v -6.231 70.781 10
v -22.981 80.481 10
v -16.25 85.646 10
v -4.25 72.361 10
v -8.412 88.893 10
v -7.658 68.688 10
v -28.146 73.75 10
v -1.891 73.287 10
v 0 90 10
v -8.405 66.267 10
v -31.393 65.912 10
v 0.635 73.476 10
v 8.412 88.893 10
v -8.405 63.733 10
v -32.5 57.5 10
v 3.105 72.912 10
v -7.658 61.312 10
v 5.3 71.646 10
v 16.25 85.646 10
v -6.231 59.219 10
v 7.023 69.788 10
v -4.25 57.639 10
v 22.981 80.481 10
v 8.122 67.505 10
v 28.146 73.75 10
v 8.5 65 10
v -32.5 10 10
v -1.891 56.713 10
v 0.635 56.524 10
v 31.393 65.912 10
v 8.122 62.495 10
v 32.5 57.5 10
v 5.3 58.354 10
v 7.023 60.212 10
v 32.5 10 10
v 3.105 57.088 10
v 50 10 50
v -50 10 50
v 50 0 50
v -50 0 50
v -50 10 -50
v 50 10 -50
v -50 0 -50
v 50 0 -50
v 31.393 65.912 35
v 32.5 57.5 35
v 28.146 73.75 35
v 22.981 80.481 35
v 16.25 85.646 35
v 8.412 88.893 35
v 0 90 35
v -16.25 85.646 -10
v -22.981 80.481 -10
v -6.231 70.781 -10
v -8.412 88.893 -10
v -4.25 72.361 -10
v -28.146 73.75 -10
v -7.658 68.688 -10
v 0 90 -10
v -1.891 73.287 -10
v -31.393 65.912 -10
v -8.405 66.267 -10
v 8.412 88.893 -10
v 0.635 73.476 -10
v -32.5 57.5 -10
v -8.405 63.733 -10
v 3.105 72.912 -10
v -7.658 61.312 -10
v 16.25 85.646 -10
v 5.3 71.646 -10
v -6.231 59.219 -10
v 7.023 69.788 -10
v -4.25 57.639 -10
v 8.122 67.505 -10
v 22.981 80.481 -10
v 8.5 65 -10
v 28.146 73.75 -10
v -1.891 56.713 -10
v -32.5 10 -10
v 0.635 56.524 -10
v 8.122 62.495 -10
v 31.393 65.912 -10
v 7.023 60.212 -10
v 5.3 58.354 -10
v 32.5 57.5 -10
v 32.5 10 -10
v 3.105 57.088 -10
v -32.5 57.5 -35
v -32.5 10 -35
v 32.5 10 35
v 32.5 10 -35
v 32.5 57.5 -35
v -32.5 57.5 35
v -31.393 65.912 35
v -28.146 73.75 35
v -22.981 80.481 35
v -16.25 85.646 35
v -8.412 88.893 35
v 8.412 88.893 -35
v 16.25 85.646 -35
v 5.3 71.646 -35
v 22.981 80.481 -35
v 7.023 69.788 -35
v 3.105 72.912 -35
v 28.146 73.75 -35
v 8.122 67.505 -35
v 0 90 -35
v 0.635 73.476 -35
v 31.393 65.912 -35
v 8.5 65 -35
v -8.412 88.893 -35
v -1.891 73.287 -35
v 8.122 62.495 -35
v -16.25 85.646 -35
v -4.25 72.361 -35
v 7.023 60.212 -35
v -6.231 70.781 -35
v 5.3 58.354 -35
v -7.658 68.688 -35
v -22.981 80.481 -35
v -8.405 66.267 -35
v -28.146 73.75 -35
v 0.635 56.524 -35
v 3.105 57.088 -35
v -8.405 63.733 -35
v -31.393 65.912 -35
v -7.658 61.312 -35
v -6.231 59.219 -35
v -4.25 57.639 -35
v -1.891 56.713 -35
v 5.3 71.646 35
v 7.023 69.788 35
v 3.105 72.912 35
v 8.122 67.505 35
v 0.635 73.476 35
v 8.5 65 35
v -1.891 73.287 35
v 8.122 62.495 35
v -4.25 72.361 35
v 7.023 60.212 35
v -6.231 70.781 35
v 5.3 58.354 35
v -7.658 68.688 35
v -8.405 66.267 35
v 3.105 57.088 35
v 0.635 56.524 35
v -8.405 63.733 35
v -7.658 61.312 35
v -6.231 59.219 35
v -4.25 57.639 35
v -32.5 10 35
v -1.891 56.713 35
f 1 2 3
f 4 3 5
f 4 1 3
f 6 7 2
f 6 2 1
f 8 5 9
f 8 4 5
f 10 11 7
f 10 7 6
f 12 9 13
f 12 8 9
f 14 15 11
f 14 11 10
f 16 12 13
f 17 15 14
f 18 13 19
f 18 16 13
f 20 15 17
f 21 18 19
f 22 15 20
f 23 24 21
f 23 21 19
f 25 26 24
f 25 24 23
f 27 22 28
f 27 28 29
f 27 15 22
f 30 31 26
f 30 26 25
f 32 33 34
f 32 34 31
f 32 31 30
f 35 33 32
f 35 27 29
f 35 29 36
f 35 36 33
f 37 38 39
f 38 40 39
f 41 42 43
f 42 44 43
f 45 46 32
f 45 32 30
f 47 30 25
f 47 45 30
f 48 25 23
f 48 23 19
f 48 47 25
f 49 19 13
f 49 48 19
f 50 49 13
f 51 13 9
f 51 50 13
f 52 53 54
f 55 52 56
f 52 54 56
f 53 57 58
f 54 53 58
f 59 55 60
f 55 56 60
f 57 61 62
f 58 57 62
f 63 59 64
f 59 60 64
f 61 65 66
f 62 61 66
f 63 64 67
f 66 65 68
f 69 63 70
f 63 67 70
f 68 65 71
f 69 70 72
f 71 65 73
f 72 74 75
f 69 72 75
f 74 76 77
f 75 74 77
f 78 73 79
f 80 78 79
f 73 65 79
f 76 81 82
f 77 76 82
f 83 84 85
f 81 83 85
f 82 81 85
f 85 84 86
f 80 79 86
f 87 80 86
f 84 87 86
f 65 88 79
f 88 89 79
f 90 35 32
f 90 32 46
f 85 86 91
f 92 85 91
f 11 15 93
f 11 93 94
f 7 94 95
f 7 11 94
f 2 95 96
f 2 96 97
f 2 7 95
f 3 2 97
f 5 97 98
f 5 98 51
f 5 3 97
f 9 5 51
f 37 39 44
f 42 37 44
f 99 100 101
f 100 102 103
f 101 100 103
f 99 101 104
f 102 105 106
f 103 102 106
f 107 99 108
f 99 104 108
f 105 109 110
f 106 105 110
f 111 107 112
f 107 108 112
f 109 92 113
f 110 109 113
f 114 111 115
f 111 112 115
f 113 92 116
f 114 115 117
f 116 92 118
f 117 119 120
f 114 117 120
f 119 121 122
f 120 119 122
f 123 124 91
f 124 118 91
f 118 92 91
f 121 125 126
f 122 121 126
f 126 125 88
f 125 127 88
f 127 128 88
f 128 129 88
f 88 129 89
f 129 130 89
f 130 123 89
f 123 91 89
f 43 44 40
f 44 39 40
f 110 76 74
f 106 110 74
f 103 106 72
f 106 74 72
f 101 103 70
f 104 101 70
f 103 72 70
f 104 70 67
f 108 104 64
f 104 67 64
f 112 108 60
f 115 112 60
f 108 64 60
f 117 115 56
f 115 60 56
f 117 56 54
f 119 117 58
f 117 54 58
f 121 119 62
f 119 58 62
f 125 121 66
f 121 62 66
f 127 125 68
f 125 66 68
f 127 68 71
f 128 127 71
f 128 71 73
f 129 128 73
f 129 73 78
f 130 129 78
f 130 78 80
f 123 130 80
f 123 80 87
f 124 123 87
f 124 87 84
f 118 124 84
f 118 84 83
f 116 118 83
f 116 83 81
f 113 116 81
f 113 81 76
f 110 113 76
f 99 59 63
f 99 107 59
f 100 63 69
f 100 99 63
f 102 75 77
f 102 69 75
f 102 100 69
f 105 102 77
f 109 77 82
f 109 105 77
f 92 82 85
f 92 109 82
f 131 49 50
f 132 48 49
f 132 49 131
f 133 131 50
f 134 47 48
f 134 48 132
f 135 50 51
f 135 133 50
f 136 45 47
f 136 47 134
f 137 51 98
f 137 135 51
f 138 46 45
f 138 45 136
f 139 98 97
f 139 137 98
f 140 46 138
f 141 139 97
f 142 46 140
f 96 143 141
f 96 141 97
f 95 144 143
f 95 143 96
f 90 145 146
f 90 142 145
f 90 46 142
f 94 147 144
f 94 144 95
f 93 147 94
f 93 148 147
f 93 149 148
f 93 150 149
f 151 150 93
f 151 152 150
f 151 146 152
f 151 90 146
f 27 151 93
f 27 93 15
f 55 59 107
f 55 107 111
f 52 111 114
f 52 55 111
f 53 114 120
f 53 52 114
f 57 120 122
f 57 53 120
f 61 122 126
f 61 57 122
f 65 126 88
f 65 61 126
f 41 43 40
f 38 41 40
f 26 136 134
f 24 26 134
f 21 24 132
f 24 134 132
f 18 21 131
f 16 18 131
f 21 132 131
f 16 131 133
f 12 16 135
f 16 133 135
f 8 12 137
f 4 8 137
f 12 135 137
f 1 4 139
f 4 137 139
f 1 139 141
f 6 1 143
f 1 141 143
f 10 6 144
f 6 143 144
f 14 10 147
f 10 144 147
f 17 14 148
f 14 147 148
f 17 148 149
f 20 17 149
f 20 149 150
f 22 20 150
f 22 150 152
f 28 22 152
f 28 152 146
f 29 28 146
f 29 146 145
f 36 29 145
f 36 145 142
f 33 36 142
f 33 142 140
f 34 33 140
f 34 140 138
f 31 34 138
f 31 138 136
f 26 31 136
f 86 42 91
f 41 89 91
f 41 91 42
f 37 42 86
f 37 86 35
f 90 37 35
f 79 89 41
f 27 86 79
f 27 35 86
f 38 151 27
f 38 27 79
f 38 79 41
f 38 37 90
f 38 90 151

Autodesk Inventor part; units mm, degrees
ref_plane "YZ Plane" through (0, 0, 0) normal (1, 0, 0) x (0, 1, 0)
ref_plane "XZ Plane" through (0, 0, 0) normal (0, 1, 0) x (-1, 0, 0)
ref_plane "XY Plane" through (0, 0, 0) normal (0, 0, 1) x (1, 0, 0)
sketch "Boceto1" plane through (0, 0, 0) normal (0, 1, 0) x (-1, 0, 0)
  line L0 (50, 50) -> (-50, 50)
  line L1 (-50, 50) -> (-50, -50)
  line L2 (-50, -50) -> (50, -50)
  line L3 (50, -50) -> (50, 50)
  line L4 (50, 50) -> (-50, -50) construction
  line L5 (-50, 50) -> (50, -50) construction
  point P0 (0, 0)
  dimension "d0" = 100
  dimension "d1" = 100
extrude "Extrusión1" add sketch "Boceto1" along normal blind 10
sketch "Boceto2" plane through (0, 10, 0) normal (0, 1, 0) x (1, 0, 0)
  line L0 (32.5, -35) -> (-32.5, -35)
  line L1 (-32.5, -35) -> (-32.5, -10)
  line L2 (-32.5, -10) -> (32.5, -10)
  line L3 (32.5, -10) -> (32.5, -35)
  line L4 (0, 0) -> (-40.0762, 0)
  line L5 (32.5, 35) -> (-32.5, 35)
  line L6 (-32.5, 35) -> (-32.5, 10)
  line L7 (-32.5, 10) -> (32.5, 10)
  line L8 (32.5, 10) -> (32.5, 35)
  dimension "d4" = 25
  dimension "d5" = 65
  dimension "d6" = 10
  dimension "d7" = 32.5
  dimension "d8" = 10
extrude "Extrusión2" add sketch "Boceto2" along normal blind 80
sketch "Boceto3" plane through (-32.5, 10, 35) normal (0, 0, 1) x (1, 0, 0)
  circle A0 centre (32.5, 55) radius 8.5
  line L0 (0, 0) -> (0, 80) projected
  line L1 (0, 80) -> (65, 80) projected
  point P0 (32.5, -10)
  dimension "d11" = 17
  dimension "d12" = 32.5
  dimension "d13" = 25
extrude "Extrusión3" cut sketch "Boceto3" against normal blind 80
fillet "Empalme1" radius 32.5 4 edges at (-32.5, 90, 22.5) (32.5, 90, 22.5) (32.5, 90, -22.5) (-32.5, 90, -22.5)
properties part number "03_10 soporte02" material "Acero ASTM A36"
